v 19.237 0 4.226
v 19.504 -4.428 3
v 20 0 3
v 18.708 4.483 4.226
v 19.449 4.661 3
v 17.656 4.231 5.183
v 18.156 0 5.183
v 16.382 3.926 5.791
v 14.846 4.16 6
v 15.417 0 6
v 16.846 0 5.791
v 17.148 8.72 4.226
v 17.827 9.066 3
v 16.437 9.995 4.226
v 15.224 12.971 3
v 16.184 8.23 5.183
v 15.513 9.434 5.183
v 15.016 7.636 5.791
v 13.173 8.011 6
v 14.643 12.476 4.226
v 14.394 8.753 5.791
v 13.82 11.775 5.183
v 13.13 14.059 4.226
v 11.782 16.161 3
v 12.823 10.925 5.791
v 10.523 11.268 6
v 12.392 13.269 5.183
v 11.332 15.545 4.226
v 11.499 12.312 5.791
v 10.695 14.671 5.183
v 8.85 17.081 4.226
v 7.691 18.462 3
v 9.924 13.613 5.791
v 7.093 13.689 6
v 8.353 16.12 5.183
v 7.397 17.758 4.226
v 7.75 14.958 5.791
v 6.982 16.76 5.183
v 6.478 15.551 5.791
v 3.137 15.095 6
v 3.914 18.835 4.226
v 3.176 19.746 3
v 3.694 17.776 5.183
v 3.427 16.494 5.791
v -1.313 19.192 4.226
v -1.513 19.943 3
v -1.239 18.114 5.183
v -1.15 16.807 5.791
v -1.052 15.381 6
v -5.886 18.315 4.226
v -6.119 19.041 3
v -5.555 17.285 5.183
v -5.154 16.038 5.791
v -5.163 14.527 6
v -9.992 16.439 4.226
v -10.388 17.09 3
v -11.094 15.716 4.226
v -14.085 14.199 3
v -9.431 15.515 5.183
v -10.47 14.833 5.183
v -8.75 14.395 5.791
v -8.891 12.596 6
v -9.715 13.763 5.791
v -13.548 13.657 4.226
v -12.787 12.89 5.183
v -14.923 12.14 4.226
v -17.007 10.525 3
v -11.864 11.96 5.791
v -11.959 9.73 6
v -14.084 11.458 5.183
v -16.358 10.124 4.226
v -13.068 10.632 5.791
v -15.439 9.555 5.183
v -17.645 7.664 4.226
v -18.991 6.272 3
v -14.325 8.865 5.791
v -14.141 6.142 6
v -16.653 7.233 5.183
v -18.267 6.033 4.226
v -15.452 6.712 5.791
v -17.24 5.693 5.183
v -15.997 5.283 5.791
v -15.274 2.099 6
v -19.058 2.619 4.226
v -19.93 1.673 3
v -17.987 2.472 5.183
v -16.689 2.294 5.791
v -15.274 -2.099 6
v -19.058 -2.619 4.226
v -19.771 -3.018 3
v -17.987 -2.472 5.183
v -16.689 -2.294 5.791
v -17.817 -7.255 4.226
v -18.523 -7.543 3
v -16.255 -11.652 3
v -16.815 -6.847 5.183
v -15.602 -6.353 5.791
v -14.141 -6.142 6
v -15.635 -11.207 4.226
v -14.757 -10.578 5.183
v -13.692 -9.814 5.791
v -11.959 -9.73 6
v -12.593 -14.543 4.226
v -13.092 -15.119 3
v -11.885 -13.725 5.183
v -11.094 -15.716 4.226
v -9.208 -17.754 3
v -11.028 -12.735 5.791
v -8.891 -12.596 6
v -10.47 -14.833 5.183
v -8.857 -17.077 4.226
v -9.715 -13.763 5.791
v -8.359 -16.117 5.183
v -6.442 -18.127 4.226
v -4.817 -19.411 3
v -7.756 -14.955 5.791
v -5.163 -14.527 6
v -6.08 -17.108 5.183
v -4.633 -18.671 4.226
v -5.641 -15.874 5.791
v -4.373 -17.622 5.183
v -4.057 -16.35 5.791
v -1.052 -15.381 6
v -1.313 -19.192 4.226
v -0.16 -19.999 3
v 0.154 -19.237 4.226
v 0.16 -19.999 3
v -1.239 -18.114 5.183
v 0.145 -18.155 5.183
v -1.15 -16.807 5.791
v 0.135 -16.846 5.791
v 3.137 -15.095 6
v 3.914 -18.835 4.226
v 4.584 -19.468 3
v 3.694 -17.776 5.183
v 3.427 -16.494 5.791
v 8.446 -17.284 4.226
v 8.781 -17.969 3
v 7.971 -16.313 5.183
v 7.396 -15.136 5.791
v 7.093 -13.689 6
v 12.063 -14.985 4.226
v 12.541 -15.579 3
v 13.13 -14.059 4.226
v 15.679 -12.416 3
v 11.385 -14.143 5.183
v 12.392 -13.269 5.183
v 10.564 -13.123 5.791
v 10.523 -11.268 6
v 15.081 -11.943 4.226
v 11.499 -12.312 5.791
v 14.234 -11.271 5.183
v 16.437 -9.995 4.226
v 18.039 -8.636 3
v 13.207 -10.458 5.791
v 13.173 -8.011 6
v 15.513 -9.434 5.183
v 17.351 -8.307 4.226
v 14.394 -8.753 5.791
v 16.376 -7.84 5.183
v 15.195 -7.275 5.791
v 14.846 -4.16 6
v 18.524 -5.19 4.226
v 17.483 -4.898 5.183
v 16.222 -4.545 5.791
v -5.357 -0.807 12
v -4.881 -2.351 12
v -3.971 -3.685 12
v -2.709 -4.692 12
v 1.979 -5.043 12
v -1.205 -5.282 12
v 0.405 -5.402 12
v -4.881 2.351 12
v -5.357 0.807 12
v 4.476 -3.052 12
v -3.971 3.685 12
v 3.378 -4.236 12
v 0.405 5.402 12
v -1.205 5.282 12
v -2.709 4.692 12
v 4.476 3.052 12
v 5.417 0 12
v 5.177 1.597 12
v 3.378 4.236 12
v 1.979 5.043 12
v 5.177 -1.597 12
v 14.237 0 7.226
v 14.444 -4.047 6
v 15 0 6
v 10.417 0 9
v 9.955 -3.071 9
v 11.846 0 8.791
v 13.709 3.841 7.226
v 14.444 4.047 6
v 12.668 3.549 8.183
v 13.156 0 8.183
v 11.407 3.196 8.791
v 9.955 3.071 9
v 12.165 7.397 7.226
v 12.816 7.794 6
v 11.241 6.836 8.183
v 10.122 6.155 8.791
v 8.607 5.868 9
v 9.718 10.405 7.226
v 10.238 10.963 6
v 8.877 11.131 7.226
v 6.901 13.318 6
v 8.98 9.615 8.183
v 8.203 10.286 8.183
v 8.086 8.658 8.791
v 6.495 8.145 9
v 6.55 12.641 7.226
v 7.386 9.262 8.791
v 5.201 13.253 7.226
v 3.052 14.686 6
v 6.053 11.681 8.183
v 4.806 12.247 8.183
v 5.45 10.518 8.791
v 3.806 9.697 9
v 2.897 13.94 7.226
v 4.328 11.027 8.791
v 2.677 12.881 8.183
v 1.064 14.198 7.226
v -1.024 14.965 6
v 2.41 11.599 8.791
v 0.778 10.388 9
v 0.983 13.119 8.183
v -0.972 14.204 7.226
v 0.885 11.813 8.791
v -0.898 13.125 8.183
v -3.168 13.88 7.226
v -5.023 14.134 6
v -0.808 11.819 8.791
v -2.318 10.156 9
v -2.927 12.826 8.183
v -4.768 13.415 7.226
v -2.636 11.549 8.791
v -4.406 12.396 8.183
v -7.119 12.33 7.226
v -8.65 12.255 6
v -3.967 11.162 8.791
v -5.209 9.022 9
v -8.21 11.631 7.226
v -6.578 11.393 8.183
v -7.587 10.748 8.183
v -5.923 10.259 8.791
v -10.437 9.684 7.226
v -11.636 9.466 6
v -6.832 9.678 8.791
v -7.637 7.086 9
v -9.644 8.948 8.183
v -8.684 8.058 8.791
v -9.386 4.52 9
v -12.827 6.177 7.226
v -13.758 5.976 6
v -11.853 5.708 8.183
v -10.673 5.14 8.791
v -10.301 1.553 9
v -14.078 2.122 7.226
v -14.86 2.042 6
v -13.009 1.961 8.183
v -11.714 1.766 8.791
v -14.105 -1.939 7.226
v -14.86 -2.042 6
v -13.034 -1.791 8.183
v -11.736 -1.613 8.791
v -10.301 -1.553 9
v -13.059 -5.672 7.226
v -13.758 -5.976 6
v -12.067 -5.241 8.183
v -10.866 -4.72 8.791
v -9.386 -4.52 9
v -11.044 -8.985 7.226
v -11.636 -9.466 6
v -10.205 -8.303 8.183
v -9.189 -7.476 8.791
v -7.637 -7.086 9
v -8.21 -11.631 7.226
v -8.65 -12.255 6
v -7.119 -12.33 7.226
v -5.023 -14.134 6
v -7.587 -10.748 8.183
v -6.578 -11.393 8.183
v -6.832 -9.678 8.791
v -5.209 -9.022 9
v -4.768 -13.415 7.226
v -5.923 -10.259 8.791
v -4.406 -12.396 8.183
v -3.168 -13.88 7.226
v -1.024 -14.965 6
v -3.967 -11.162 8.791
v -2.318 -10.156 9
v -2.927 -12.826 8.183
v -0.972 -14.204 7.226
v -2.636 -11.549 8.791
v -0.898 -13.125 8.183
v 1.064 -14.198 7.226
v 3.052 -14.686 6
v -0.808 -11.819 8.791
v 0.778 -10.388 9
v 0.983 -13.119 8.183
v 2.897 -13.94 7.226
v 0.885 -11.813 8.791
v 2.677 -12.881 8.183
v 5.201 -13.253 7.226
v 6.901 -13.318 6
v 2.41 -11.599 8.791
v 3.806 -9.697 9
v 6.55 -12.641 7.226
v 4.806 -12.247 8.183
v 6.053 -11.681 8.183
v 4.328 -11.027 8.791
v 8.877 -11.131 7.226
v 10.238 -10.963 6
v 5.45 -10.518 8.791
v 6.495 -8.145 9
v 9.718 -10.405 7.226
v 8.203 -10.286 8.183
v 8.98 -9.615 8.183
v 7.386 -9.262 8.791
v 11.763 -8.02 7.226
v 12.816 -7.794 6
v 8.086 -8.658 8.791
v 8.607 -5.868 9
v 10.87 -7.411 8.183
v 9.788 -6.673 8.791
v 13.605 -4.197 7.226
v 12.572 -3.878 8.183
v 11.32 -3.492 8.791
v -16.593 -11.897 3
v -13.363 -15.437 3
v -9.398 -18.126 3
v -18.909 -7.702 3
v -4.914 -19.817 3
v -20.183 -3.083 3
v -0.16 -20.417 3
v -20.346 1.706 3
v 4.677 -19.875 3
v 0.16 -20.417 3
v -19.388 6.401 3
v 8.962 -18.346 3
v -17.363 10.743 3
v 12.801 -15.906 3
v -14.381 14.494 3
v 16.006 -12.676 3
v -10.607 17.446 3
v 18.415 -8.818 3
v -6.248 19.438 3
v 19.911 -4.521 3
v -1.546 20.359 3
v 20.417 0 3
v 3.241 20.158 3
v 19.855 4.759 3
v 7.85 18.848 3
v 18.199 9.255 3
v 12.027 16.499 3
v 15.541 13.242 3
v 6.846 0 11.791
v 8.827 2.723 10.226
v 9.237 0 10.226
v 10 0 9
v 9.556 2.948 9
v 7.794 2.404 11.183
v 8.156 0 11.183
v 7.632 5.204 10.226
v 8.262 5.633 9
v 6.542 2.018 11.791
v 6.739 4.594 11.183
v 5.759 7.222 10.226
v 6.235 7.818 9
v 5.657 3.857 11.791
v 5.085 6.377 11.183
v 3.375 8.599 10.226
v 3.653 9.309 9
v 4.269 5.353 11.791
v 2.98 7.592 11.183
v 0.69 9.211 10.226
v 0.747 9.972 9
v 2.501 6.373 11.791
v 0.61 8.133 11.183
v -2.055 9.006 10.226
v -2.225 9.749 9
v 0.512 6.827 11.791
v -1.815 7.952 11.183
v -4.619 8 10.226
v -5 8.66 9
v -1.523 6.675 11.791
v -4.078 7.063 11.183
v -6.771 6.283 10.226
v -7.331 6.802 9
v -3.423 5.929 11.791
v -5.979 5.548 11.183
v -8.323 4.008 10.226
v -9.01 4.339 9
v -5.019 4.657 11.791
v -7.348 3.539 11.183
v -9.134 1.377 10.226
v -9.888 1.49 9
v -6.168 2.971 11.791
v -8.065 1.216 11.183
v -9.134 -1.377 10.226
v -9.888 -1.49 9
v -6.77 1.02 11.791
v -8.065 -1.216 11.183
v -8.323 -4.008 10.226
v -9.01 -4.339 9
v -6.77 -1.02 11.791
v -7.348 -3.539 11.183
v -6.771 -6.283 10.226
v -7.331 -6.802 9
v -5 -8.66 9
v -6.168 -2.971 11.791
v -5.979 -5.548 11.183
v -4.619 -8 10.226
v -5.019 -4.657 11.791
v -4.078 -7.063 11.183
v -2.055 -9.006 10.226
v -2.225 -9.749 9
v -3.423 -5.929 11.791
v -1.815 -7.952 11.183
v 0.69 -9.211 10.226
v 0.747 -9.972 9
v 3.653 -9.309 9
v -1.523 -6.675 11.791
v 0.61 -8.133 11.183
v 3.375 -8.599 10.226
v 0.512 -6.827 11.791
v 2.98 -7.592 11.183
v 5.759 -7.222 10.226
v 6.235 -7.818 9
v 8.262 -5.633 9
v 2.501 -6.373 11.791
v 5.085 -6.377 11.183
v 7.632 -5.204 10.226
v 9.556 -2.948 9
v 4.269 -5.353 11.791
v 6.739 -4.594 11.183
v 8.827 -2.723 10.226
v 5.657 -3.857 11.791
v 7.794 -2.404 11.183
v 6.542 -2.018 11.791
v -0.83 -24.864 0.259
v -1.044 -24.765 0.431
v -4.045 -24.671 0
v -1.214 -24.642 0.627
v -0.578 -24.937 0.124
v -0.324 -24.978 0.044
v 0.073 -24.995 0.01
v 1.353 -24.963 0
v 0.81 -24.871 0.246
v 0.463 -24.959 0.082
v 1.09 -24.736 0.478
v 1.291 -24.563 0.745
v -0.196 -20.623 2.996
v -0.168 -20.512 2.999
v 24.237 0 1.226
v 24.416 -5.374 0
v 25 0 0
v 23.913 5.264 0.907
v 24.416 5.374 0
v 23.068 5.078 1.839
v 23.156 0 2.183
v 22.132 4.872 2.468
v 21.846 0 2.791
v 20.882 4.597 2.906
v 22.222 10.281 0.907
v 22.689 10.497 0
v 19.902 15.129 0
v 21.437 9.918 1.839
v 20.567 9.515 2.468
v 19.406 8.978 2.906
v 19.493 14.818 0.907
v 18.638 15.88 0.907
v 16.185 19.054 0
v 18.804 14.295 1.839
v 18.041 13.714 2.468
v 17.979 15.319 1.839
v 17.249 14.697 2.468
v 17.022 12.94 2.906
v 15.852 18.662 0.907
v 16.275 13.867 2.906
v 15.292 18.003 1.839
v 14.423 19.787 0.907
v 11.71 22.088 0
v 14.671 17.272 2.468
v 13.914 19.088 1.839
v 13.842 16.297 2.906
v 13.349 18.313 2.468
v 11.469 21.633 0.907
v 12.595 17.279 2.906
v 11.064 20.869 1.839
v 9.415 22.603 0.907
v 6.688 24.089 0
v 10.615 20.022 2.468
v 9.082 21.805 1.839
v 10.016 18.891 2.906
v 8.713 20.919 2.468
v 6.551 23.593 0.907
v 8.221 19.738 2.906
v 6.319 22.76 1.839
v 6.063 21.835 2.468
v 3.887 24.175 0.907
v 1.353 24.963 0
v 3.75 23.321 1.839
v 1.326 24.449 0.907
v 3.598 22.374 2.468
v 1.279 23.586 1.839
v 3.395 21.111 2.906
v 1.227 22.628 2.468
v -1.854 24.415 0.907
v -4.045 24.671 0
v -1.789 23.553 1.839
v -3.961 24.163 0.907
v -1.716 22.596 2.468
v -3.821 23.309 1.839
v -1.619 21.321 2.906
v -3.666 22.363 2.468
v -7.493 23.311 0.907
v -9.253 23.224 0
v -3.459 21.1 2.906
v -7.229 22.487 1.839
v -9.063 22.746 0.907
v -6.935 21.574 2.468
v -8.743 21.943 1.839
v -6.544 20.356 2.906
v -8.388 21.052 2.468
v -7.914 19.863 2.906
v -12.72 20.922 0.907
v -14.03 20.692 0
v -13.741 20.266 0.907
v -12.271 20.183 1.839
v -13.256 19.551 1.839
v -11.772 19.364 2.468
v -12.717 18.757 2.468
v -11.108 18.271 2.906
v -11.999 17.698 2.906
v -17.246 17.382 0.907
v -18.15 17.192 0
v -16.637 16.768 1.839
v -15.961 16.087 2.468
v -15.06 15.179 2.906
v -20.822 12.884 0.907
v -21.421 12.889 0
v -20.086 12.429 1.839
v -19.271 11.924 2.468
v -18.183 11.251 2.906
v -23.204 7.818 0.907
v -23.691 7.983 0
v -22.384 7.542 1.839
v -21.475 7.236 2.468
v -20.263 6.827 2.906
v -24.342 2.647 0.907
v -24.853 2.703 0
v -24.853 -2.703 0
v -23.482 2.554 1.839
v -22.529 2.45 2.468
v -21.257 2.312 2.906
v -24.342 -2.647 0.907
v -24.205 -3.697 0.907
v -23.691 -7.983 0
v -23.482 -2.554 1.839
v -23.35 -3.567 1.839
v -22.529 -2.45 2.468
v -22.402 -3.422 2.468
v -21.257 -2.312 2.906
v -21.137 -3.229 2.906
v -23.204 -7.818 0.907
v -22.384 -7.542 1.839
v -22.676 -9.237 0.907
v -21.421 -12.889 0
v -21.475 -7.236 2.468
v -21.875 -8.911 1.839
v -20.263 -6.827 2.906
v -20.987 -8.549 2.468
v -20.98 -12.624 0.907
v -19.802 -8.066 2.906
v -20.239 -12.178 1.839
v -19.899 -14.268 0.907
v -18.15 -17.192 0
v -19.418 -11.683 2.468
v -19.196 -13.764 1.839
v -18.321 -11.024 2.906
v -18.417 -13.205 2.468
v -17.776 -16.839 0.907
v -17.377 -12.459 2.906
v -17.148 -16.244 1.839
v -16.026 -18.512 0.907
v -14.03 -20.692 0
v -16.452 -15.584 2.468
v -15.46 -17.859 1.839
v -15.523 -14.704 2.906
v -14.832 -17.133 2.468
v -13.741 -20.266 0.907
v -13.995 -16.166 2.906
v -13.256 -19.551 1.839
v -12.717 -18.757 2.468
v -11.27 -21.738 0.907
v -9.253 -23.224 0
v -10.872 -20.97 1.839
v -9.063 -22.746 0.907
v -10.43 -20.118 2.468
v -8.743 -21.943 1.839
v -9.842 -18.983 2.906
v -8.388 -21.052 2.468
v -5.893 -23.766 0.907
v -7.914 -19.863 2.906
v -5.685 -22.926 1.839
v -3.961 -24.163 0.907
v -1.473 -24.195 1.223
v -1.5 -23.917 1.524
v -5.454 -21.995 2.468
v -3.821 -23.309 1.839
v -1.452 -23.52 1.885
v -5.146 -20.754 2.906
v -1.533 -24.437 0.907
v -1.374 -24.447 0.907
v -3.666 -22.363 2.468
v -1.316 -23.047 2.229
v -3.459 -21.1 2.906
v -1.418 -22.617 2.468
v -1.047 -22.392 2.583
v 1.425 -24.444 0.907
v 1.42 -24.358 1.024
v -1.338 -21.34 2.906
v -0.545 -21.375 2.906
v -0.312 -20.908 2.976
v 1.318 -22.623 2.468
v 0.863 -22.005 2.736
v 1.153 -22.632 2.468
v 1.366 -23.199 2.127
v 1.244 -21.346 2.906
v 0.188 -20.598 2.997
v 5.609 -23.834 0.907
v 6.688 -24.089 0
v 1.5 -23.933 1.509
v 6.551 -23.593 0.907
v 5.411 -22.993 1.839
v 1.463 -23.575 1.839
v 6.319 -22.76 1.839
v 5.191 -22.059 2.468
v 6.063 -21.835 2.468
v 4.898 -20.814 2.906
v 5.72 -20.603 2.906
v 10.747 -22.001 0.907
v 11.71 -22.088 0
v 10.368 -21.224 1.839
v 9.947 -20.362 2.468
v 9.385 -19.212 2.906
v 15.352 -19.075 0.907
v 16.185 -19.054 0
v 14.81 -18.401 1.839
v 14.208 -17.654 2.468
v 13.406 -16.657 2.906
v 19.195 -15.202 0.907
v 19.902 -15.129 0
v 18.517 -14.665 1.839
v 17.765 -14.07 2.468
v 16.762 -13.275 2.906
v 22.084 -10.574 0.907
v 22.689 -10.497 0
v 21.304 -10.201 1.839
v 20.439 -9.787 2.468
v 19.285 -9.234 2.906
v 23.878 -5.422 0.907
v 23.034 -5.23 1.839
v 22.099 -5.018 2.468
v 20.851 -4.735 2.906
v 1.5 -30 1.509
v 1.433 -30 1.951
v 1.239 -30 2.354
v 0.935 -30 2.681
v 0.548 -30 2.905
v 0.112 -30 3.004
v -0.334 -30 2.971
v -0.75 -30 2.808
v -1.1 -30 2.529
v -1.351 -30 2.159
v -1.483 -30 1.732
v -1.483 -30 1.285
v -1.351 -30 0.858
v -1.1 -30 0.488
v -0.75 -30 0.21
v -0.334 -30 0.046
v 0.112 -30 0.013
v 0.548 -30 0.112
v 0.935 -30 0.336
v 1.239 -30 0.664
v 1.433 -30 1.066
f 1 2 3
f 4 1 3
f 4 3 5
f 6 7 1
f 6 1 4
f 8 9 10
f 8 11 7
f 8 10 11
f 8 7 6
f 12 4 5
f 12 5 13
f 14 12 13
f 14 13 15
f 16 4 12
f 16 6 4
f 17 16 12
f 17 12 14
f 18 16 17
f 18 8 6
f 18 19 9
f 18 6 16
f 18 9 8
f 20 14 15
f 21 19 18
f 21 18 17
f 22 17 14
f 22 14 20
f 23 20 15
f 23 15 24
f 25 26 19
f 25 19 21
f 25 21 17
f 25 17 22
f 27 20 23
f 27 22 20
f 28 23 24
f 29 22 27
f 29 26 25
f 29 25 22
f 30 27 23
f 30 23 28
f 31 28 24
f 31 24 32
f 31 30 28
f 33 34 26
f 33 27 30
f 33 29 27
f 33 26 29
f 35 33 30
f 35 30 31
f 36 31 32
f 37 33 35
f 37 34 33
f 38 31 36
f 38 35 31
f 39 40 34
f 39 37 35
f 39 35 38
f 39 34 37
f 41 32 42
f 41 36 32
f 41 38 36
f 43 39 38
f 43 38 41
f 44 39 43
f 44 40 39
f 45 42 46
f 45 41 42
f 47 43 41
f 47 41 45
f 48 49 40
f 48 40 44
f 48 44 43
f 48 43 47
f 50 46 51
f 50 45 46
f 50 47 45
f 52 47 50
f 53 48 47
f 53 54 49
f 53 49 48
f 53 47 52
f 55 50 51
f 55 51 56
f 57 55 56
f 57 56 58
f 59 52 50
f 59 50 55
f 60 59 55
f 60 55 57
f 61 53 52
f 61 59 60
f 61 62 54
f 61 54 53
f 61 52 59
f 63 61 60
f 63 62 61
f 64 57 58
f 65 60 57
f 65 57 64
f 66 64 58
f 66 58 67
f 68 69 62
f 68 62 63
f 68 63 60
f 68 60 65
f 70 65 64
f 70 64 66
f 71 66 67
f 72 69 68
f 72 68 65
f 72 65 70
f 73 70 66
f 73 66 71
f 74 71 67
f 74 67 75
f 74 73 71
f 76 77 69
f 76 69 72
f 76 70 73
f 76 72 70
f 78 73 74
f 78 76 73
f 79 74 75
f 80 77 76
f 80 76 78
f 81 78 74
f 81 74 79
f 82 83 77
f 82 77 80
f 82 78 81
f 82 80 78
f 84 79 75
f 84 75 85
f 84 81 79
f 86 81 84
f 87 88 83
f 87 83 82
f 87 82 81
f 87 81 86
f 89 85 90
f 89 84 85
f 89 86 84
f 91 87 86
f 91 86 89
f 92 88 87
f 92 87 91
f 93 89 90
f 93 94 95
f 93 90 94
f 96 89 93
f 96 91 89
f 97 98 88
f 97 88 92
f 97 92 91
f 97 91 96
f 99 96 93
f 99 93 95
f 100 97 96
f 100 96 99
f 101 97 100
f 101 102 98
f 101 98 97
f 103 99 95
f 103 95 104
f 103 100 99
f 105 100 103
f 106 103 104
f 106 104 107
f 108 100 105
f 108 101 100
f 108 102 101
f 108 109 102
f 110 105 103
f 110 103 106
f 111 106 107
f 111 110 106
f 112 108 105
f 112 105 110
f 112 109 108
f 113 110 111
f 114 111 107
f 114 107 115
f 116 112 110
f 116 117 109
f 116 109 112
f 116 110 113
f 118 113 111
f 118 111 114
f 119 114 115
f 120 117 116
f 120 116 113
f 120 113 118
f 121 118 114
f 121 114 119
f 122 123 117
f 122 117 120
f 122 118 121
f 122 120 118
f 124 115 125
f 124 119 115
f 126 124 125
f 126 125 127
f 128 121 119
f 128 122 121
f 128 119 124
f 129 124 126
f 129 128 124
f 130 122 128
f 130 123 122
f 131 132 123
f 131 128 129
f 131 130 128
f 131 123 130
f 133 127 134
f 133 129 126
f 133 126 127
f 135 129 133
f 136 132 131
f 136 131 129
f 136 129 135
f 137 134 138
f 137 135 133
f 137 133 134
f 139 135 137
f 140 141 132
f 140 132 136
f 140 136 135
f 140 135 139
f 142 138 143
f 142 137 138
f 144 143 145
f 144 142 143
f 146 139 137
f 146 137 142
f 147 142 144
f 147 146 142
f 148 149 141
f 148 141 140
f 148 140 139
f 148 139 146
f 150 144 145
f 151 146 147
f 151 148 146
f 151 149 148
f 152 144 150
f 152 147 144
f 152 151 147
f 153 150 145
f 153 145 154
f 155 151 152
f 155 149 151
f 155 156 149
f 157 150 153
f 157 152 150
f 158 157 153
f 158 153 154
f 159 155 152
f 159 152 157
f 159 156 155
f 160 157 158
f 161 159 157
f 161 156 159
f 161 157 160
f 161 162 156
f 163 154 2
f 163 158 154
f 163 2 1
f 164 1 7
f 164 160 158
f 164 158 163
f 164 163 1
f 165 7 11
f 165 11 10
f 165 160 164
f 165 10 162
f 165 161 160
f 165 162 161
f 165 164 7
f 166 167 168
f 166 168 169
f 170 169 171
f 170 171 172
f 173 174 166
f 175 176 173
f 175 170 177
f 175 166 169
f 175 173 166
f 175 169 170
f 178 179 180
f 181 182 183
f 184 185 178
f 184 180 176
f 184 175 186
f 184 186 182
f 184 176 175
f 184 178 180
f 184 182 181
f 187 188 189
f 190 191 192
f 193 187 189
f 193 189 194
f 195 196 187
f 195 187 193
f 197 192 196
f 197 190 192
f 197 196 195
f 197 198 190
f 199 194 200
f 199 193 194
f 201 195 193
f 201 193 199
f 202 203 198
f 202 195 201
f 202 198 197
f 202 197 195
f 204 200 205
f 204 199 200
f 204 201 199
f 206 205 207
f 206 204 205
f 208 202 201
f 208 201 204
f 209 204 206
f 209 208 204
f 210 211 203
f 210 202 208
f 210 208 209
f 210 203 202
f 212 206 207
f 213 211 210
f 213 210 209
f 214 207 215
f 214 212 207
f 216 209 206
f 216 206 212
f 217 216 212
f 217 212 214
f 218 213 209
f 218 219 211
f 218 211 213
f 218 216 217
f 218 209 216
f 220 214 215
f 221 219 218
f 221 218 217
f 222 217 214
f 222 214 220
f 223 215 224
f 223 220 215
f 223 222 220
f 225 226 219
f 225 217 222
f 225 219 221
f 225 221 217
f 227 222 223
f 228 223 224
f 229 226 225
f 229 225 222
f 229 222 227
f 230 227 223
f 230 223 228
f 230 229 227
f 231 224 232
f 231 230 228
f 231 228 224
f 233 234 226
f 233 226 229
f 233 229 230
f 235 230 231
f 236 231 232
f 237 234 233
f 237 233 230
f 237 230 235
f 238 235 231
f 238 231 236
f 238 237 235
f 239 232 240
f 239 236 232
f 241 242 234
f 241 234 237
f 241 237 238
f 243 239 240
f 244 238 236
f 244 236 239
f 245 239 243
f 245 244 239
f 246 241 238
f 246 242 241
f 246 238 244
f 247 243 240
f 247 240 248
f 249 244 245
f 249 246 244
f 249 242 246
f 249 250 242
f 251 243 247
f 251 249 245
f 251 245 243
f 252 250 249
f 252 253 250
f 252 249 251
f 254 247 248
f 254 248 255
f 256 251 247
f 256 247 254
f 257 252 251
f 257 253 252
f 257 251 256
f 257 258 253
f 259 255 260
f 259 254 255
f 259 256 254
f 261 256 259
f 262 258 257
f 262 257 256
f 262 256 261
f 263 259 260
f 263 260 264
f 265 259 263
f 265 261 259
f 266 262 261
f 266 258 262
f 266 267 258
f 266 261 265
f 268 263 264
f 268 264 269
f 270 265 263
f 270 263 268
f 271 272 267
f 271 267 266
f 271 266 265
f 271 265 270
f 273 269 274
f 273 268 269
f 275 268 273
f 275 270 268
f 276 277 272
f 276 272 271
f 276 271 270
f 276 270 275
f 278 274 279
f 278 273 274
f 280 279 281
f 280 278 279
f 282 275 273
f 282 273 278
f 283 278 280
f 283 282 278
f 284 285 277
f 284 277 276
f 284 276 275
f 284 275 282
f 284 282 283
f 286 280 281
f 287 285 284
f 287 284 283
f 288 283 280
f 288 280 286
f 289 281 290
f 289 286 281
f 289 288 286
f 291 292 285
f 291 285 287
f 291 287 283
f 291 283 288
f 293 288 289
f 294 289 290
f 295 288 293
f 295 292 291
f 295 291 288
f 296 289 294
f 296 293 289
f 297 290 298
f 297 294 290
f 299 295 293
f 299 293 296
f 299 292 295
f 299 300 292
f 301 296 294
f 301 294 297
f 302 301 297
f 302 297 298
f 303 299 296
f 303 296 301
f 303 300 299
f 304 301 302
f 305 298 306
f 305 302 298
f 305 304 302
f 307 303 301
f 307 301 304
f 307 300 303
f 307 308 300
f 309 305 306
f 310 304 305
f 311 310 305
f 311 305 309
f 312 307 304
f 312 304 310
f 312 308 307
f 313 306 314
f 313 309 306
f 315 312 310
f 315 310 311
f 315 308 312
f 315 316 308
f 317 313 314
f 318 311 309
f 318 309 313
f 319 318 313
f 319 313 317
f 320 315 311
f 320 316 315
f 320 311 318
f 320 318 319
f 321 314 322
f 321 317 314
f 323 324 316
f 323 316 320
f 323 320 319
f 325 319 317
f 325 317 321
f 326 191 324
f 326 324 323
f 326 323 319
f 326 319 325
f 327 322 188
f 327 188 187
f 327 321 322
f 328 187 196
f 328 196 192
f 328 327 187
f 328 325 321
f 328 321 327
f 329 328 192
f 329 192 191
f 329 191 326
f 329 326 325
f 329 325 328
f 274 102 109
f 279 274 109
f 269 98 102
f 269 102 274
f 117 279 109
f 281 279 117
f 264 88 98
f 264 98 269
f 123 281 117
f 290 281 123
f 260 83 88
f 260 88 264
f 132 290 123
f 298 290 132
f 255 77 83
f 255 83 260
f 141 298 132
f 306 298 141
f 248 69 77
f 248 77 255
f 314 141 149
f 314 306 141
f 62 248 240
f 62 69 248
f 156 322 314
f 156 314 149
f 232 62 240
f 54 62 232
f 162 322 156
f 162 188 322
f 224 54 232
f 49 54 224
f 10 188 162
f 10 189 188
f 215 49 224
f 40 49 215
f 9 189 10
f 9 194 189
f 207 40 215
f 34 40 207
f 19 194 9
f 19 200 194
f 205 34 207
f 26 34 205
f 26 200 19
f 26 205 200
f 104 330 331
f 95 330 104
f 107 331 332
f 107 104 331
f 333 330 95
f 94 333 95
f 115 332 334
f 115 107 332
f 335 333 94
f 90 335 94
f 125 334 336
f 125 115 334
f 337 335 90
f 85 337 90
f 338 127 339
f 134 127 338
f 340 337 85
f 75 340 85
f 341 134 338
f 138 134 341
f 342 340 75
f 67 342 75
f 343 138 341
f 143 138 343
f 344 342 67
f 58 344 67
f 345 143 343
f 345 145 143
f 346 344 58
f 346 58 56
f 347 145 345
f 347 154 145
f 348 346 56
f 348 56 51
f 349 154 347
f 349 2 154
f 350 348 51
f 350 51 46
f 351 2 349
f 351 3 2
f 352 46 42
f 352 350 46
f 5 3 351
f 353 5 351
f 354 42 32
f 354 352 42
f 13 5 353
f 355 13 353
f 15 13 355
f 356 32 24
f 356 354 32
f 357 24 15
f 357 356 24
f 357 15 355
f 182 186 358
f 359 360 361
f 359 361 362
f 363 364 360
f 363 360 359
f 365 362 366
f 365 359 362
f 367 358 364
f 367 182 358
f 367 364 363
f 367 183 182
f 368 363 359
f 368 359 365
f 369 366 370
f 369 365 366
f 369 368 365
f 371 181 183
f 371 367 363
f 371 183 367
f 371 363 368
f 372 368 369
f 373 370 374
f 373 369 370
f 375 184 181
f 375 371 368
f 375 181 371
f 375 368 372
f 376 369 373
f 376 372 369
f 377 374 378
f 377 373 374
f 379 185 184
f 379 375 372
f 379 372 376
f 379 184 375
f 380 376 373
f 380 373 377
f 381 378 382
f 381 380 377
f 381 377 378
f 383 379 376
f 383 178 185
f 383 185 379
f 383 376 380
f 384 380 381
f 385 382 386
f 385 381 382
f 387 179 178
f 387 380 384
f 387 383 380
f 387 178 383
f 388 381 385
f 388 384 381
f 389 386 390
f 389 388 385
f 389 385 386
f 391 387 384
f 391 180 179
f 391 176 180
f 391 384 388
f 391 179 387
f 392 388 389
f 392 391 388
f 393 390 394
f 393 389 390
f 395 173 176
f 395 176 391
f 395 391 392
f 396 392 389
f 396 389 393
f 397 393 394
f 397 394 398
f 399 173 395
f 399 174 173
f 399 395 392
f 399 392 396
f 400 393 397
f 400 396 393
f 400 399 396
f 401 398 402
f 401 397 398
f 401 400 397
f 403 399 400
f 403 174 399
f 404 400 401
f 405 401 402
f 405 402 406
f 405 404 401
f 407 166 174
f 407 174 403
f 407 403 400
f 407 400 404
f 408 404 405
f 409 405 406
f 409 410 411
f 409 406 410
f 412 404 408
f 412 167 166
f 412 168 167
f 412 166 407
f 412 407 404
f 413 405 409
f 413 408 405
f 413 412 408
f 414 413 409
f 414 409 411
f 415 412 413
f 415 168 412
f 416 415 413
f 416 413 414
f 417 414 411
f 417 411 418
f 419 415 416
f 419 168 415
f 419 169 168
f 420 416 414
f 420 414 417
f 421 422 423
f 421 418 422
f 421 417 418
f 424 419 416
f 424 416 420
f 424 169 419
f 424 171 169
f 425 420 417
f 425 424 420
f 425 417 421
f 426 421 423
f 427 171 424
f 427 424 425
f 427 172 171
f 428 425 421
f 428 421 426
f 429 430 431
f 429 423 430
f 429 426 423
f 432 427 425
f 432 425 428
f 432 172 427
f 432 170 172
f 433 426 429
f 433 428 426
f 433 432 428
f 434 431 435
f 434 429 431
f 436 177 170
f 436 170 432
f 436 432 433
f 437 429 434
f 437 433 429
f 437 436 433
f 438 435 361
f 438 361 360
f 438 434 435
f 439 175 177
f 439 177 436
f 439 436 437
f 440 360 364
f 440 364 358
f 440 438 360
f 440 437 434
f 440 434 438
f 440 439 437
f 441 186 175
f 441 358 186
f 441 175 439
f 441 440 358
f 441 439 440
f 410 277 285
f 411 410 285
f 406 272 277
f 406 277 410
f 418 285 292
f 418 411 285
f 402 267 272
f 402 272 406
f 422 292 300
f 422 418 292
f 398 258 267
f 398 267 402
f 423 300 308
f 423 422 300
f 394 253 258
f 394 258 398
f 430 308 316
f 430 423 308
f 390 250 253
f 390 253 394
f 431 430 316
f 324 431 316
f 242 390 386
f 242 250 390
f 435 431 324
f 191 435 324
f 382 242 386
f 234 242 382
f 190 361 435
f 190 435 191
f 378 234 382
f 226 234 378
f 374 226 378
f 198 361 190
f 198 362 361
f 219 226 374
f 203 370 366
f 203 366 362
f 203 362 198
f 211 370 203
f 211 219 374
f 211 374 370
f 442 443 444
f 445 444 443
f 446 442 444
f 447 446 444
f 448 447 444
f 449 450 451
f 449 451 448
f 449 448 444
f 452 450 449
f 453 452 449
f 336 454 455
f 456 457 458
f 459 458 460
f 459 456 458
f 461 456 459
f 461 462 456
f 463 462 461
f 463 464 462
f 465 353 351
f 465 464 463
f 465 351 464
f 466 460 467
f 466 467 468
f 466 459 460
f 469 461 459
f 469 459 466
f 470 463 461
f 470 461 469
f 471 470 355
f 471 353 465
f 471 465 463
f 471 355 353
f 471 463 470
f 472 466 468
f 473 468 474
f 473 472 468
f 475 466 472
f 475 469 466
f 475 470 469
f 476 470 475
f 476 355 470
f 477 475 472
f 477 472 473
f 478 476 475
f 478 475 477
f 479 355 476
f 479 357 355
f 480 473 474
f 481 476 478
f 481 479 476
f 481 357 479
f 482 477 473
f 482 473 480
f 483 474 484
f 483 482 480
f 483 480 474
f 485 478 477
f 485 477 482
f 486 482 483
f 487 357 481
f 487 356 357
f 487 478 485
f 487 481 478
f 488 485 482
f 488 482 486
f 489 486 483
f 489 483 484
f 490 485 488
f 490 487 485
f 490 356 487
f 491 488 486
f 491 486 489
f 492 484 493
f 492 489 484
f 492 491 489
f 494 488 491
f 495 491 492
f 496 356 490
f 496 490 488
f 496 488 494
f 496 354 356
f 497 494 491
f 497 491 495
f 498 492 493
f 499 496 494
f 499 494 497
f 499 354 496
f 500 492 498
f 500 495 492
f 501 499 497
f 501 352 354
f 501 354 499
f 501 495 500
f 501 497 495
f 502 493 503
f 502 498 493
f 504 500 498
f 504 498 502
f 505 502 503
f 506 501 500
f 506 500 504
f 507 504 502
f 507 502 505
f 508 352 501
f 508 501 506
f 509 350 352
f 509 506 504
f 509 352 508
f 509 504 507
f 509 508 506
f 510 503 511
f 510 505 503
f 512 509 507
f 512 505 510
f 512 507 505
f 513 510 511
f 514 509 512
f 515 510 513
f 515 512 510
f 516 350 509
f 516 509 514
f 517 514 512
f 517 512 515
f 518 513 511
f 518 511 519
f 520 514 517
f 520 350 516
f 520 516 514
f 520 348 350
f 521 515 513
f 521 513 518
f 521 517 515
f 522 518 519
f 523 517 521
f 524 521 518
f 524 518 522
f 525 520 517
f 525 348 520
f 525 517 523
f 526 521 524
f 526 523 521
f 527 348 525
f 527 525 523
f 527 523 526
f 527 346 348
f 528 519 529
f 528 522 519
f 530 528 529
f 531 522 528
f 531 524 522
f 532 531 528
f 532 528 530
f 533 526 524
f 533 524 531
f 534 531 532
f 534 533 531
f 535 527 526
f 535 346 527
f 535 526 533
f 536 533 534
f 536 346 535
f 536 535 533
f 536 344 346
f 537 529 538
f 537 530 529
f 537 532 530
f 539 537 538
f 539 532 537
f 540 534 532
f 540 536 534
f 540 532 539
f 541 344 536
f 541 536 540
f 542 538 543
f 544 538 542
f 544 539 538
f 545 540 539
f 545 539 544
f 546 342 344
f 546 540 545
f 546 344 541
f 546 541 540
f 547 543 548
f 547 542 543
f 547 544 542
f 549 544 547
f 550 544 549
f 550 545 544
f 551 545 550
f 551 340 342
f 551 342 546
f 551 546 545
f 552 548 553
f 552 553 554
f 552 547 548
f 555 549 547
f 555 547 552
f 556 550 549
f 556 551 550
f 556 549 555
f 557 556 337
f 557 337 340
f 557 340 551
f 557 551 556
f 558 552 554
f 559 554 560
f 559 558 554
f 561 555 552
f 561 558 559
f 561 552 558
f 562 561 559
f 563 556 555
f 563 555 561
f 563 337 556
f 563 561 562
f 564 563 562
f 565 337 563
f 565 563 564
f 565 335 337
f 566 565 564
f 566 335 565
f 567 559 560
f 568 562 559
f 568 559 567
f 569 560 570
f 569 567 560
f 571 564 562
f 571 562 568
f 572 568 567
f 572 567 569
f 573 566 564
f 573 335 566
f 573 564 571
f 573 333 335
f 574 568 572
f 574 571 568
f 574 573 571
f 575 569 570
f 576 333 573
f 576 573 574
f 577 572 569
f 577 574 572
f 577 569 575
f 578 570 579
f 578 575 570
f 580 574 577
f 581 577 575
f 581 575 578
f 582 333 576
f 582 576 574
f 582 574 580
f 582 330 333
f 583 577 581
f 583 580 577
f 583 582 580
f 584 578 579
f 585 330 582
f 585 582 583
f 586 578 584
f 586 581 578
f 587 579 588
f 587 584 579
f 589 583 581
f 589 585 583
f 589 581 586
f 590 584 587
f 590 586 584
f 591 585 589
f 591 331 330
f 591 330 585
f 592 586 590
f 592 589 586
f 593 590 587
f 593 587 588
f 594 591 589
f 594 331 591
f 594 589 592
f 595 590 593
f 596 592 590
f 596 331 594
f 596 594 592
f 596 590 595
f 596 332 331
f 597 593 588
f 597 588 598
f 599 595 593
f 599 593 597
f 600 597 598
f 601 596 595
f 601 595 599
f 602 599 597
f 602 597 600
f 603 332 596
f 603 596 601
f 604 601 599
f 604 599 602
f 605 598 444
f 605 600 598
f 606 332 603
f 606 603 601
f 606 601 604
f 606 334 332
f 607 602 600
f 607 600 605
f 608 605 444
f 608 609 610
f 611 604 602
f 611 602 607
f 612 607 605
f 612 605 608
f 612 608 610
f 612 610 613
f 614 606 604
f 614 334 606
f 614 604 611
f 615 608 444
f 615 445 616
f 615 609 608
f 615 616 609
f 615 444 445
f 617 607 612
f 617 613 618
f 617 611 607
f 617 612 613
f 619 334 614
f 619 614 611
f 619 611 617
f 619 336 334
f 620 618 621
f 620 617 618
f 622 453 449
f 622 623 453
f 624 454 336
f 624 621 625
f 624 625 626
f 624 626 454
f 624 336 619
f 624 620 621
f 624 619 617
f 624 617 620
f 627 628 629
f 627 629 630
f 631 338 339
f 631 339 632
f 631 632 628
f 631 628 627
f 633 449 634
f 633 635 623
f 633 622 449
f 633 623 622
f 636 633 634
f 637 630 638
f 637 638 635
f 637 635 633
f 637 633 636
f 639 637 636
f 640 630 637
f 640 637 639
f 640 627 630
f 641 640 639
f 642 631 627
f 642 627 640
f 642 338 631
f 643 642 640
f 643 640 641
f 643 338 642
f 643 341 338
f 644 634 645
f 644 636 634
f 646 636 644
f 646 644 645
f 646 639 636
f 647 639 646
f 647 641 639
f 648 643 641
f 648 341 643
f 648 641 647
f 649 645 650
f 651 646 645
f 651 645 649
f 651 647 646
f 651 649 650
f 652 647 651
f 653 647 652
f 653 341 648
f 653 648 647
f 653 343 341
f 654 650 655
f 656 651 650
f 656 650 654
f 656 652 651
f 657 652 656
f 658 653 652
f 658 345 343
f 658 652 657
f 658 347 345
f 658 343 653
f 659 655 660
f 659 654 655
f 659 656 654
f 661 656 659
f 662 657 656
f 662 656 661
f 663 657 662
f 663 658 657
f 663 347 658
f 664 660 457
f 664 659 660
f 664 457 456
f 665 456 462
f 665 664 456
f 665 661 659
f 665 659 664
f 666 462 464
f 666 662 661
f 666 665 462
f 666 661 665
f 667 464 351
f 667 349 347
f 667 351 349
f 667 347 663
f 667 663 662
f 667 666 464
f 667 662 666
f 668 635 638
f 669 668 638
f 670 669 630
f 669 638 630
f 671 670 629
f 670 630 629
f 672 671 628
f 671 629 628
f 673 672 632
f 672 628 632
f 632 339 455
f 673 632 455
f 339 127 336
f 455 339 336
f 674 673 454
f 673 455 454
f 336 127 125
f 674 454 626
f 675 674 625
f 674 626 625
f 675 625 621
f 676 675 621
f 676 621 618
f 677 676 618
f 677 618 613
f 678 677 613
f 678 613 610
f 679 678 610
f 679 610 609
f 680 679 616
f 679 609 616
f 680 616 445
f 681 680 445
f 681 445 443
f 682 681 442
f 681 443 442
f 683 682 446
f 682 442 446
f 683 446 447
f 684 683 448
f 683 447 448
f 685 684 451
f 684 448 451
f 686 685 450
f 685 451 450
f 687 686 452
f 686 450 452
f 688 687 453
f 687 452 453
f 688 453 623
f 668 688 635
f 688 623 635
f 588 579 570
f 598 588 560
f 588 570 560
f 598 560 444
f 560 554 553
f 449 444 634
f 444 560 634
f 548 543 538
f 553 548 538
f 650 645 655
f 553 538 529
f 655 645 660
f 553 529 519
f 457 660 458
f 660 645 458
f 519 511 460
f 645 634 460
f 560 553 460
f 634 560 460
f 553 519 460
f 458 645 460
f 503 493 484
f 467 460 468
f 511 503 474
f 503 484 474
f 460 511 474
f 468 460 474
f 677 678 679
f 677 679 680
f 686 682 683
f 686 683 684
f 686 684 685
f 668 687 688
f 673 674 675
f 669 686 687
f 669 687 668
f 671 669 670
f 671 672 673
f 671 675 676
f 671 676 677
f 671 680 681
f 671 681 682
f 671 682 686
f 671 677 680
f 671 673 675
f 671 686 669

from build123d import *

# Parameters (mm, degrees)
F0_R      = 25
F2_DEPTH  = 3
F1_R      = 20
F3_DEPTH  = 6
F4_R      = 15
F5_DEPTH  = 9
F6_R      = 10
F7_DEPTH  = 12
F12_R     = 1.5
F13_DEPTH = 30


# Not quite as in the source:
# - a fillet or chamfer that OpenCascade refuses, or shapes differently, is made with other operations: its cross-section is extruded or revolved along the edge and cut away or added


with BuildPart() as f2:
    # F0 (on Top) → F2 (new body)
    with BuildSketch(Plane.XY):
        Circle(F0_R)
    extrude(amount=F2_DEPTH)

    # F1 (on Top) → F3 (join)
    with BuildSketch(Plane.XY):
        Circle(F1_R)
    extrude(amount=F3_DEPTH)

    # F4 (on Top) → F5 (join)
    with BuildSketch(Plane.XY):
        Circle(F4_R)
    extrude(amount=F5_DEPTH)

    # F6 (on Top) → F7 (join)
    with BuildSketch(Plane.XY):
        Circle(F6_R)
    extrude(amount=F7_DEPTH)

    # F8: fillet of radius 5 on 1 edges, made by hand

    # F8_s1 → F8_t2 (revolve, cut)
    with BuildSketch(Plane.XZ):
        with BuildLine():
            ThreePointArc((10, 9), (8.1560370926, 11.1833001327), (5.417424305, 12))
            Line((5.417424305, 12), (10, 12))
            Line((10, 12), (10, 9))
        make_face()
    revolve(axis=Axis((0, 0, 12), (0, 0, 1)), mode=Mode.SUBTRACT)

    # F9: fillet of radius 5 on 1 edges, made by hand

    # F9_s1 → F9_t2 (revolve, cut)
    with BuildSketch(Plane.XZ):
        with BuildLine():
            ThreePointArc((15, 6), (13.1560370926, 8.1833001327), (10.417424305, 9))
            Line((10.417424305, 9), (15, 9))
            Line((15, 9), (15, 6))
        make_face()
    revolve(axis=Axis((0, 0, 9), (0, 0, 1)), mode=Mode.SUBTRACT)

    # F10: fillet of radius 5 on 1 edges, made by hand

    # F10_s1 → F10_t2 (revolve, cut)
    with BuildSketch(Plane.XZ):
        with BuildLine():
            ThreePointArc((20, 3), (18.1560370926, 5.1833001327), (15.417424305, 6))
            Line((15.417424305, 6), (20, 6))
            Line((20, 6), (20, 3))
        make_face()
    revolve(axis=Axis((0, 0, 6), (0, 0, 1)), mode=Mode.SUBTRACT)

    # F11: fillet of radius 5 on 1 edges, made by hand

    # F11_s1 → F11_t2 (revolve, cut)
    with BuildSketch(Plane.XZ):
        with BuildLine():
            ThreePointArc((25, 0), (23.1560370926, 2.1833001327), (20.417424305, 3))
            Line((20.417424305, 3), (25, 3))
            Line((25, 3), (25, 0))
        make_face()
    revolve(axis=Axis((0, 0, 3), (0, 0, 1)), mode=Mode.SUBTRACT)

    # F12 (on Front) → F13 (join)
    with BuildSketch(Plane.XZ):
        with Locations((0, 1.508576342)):
            Circle(F12_R)
    extrude(amount=F13_DEPTH)


solid = f2.part
